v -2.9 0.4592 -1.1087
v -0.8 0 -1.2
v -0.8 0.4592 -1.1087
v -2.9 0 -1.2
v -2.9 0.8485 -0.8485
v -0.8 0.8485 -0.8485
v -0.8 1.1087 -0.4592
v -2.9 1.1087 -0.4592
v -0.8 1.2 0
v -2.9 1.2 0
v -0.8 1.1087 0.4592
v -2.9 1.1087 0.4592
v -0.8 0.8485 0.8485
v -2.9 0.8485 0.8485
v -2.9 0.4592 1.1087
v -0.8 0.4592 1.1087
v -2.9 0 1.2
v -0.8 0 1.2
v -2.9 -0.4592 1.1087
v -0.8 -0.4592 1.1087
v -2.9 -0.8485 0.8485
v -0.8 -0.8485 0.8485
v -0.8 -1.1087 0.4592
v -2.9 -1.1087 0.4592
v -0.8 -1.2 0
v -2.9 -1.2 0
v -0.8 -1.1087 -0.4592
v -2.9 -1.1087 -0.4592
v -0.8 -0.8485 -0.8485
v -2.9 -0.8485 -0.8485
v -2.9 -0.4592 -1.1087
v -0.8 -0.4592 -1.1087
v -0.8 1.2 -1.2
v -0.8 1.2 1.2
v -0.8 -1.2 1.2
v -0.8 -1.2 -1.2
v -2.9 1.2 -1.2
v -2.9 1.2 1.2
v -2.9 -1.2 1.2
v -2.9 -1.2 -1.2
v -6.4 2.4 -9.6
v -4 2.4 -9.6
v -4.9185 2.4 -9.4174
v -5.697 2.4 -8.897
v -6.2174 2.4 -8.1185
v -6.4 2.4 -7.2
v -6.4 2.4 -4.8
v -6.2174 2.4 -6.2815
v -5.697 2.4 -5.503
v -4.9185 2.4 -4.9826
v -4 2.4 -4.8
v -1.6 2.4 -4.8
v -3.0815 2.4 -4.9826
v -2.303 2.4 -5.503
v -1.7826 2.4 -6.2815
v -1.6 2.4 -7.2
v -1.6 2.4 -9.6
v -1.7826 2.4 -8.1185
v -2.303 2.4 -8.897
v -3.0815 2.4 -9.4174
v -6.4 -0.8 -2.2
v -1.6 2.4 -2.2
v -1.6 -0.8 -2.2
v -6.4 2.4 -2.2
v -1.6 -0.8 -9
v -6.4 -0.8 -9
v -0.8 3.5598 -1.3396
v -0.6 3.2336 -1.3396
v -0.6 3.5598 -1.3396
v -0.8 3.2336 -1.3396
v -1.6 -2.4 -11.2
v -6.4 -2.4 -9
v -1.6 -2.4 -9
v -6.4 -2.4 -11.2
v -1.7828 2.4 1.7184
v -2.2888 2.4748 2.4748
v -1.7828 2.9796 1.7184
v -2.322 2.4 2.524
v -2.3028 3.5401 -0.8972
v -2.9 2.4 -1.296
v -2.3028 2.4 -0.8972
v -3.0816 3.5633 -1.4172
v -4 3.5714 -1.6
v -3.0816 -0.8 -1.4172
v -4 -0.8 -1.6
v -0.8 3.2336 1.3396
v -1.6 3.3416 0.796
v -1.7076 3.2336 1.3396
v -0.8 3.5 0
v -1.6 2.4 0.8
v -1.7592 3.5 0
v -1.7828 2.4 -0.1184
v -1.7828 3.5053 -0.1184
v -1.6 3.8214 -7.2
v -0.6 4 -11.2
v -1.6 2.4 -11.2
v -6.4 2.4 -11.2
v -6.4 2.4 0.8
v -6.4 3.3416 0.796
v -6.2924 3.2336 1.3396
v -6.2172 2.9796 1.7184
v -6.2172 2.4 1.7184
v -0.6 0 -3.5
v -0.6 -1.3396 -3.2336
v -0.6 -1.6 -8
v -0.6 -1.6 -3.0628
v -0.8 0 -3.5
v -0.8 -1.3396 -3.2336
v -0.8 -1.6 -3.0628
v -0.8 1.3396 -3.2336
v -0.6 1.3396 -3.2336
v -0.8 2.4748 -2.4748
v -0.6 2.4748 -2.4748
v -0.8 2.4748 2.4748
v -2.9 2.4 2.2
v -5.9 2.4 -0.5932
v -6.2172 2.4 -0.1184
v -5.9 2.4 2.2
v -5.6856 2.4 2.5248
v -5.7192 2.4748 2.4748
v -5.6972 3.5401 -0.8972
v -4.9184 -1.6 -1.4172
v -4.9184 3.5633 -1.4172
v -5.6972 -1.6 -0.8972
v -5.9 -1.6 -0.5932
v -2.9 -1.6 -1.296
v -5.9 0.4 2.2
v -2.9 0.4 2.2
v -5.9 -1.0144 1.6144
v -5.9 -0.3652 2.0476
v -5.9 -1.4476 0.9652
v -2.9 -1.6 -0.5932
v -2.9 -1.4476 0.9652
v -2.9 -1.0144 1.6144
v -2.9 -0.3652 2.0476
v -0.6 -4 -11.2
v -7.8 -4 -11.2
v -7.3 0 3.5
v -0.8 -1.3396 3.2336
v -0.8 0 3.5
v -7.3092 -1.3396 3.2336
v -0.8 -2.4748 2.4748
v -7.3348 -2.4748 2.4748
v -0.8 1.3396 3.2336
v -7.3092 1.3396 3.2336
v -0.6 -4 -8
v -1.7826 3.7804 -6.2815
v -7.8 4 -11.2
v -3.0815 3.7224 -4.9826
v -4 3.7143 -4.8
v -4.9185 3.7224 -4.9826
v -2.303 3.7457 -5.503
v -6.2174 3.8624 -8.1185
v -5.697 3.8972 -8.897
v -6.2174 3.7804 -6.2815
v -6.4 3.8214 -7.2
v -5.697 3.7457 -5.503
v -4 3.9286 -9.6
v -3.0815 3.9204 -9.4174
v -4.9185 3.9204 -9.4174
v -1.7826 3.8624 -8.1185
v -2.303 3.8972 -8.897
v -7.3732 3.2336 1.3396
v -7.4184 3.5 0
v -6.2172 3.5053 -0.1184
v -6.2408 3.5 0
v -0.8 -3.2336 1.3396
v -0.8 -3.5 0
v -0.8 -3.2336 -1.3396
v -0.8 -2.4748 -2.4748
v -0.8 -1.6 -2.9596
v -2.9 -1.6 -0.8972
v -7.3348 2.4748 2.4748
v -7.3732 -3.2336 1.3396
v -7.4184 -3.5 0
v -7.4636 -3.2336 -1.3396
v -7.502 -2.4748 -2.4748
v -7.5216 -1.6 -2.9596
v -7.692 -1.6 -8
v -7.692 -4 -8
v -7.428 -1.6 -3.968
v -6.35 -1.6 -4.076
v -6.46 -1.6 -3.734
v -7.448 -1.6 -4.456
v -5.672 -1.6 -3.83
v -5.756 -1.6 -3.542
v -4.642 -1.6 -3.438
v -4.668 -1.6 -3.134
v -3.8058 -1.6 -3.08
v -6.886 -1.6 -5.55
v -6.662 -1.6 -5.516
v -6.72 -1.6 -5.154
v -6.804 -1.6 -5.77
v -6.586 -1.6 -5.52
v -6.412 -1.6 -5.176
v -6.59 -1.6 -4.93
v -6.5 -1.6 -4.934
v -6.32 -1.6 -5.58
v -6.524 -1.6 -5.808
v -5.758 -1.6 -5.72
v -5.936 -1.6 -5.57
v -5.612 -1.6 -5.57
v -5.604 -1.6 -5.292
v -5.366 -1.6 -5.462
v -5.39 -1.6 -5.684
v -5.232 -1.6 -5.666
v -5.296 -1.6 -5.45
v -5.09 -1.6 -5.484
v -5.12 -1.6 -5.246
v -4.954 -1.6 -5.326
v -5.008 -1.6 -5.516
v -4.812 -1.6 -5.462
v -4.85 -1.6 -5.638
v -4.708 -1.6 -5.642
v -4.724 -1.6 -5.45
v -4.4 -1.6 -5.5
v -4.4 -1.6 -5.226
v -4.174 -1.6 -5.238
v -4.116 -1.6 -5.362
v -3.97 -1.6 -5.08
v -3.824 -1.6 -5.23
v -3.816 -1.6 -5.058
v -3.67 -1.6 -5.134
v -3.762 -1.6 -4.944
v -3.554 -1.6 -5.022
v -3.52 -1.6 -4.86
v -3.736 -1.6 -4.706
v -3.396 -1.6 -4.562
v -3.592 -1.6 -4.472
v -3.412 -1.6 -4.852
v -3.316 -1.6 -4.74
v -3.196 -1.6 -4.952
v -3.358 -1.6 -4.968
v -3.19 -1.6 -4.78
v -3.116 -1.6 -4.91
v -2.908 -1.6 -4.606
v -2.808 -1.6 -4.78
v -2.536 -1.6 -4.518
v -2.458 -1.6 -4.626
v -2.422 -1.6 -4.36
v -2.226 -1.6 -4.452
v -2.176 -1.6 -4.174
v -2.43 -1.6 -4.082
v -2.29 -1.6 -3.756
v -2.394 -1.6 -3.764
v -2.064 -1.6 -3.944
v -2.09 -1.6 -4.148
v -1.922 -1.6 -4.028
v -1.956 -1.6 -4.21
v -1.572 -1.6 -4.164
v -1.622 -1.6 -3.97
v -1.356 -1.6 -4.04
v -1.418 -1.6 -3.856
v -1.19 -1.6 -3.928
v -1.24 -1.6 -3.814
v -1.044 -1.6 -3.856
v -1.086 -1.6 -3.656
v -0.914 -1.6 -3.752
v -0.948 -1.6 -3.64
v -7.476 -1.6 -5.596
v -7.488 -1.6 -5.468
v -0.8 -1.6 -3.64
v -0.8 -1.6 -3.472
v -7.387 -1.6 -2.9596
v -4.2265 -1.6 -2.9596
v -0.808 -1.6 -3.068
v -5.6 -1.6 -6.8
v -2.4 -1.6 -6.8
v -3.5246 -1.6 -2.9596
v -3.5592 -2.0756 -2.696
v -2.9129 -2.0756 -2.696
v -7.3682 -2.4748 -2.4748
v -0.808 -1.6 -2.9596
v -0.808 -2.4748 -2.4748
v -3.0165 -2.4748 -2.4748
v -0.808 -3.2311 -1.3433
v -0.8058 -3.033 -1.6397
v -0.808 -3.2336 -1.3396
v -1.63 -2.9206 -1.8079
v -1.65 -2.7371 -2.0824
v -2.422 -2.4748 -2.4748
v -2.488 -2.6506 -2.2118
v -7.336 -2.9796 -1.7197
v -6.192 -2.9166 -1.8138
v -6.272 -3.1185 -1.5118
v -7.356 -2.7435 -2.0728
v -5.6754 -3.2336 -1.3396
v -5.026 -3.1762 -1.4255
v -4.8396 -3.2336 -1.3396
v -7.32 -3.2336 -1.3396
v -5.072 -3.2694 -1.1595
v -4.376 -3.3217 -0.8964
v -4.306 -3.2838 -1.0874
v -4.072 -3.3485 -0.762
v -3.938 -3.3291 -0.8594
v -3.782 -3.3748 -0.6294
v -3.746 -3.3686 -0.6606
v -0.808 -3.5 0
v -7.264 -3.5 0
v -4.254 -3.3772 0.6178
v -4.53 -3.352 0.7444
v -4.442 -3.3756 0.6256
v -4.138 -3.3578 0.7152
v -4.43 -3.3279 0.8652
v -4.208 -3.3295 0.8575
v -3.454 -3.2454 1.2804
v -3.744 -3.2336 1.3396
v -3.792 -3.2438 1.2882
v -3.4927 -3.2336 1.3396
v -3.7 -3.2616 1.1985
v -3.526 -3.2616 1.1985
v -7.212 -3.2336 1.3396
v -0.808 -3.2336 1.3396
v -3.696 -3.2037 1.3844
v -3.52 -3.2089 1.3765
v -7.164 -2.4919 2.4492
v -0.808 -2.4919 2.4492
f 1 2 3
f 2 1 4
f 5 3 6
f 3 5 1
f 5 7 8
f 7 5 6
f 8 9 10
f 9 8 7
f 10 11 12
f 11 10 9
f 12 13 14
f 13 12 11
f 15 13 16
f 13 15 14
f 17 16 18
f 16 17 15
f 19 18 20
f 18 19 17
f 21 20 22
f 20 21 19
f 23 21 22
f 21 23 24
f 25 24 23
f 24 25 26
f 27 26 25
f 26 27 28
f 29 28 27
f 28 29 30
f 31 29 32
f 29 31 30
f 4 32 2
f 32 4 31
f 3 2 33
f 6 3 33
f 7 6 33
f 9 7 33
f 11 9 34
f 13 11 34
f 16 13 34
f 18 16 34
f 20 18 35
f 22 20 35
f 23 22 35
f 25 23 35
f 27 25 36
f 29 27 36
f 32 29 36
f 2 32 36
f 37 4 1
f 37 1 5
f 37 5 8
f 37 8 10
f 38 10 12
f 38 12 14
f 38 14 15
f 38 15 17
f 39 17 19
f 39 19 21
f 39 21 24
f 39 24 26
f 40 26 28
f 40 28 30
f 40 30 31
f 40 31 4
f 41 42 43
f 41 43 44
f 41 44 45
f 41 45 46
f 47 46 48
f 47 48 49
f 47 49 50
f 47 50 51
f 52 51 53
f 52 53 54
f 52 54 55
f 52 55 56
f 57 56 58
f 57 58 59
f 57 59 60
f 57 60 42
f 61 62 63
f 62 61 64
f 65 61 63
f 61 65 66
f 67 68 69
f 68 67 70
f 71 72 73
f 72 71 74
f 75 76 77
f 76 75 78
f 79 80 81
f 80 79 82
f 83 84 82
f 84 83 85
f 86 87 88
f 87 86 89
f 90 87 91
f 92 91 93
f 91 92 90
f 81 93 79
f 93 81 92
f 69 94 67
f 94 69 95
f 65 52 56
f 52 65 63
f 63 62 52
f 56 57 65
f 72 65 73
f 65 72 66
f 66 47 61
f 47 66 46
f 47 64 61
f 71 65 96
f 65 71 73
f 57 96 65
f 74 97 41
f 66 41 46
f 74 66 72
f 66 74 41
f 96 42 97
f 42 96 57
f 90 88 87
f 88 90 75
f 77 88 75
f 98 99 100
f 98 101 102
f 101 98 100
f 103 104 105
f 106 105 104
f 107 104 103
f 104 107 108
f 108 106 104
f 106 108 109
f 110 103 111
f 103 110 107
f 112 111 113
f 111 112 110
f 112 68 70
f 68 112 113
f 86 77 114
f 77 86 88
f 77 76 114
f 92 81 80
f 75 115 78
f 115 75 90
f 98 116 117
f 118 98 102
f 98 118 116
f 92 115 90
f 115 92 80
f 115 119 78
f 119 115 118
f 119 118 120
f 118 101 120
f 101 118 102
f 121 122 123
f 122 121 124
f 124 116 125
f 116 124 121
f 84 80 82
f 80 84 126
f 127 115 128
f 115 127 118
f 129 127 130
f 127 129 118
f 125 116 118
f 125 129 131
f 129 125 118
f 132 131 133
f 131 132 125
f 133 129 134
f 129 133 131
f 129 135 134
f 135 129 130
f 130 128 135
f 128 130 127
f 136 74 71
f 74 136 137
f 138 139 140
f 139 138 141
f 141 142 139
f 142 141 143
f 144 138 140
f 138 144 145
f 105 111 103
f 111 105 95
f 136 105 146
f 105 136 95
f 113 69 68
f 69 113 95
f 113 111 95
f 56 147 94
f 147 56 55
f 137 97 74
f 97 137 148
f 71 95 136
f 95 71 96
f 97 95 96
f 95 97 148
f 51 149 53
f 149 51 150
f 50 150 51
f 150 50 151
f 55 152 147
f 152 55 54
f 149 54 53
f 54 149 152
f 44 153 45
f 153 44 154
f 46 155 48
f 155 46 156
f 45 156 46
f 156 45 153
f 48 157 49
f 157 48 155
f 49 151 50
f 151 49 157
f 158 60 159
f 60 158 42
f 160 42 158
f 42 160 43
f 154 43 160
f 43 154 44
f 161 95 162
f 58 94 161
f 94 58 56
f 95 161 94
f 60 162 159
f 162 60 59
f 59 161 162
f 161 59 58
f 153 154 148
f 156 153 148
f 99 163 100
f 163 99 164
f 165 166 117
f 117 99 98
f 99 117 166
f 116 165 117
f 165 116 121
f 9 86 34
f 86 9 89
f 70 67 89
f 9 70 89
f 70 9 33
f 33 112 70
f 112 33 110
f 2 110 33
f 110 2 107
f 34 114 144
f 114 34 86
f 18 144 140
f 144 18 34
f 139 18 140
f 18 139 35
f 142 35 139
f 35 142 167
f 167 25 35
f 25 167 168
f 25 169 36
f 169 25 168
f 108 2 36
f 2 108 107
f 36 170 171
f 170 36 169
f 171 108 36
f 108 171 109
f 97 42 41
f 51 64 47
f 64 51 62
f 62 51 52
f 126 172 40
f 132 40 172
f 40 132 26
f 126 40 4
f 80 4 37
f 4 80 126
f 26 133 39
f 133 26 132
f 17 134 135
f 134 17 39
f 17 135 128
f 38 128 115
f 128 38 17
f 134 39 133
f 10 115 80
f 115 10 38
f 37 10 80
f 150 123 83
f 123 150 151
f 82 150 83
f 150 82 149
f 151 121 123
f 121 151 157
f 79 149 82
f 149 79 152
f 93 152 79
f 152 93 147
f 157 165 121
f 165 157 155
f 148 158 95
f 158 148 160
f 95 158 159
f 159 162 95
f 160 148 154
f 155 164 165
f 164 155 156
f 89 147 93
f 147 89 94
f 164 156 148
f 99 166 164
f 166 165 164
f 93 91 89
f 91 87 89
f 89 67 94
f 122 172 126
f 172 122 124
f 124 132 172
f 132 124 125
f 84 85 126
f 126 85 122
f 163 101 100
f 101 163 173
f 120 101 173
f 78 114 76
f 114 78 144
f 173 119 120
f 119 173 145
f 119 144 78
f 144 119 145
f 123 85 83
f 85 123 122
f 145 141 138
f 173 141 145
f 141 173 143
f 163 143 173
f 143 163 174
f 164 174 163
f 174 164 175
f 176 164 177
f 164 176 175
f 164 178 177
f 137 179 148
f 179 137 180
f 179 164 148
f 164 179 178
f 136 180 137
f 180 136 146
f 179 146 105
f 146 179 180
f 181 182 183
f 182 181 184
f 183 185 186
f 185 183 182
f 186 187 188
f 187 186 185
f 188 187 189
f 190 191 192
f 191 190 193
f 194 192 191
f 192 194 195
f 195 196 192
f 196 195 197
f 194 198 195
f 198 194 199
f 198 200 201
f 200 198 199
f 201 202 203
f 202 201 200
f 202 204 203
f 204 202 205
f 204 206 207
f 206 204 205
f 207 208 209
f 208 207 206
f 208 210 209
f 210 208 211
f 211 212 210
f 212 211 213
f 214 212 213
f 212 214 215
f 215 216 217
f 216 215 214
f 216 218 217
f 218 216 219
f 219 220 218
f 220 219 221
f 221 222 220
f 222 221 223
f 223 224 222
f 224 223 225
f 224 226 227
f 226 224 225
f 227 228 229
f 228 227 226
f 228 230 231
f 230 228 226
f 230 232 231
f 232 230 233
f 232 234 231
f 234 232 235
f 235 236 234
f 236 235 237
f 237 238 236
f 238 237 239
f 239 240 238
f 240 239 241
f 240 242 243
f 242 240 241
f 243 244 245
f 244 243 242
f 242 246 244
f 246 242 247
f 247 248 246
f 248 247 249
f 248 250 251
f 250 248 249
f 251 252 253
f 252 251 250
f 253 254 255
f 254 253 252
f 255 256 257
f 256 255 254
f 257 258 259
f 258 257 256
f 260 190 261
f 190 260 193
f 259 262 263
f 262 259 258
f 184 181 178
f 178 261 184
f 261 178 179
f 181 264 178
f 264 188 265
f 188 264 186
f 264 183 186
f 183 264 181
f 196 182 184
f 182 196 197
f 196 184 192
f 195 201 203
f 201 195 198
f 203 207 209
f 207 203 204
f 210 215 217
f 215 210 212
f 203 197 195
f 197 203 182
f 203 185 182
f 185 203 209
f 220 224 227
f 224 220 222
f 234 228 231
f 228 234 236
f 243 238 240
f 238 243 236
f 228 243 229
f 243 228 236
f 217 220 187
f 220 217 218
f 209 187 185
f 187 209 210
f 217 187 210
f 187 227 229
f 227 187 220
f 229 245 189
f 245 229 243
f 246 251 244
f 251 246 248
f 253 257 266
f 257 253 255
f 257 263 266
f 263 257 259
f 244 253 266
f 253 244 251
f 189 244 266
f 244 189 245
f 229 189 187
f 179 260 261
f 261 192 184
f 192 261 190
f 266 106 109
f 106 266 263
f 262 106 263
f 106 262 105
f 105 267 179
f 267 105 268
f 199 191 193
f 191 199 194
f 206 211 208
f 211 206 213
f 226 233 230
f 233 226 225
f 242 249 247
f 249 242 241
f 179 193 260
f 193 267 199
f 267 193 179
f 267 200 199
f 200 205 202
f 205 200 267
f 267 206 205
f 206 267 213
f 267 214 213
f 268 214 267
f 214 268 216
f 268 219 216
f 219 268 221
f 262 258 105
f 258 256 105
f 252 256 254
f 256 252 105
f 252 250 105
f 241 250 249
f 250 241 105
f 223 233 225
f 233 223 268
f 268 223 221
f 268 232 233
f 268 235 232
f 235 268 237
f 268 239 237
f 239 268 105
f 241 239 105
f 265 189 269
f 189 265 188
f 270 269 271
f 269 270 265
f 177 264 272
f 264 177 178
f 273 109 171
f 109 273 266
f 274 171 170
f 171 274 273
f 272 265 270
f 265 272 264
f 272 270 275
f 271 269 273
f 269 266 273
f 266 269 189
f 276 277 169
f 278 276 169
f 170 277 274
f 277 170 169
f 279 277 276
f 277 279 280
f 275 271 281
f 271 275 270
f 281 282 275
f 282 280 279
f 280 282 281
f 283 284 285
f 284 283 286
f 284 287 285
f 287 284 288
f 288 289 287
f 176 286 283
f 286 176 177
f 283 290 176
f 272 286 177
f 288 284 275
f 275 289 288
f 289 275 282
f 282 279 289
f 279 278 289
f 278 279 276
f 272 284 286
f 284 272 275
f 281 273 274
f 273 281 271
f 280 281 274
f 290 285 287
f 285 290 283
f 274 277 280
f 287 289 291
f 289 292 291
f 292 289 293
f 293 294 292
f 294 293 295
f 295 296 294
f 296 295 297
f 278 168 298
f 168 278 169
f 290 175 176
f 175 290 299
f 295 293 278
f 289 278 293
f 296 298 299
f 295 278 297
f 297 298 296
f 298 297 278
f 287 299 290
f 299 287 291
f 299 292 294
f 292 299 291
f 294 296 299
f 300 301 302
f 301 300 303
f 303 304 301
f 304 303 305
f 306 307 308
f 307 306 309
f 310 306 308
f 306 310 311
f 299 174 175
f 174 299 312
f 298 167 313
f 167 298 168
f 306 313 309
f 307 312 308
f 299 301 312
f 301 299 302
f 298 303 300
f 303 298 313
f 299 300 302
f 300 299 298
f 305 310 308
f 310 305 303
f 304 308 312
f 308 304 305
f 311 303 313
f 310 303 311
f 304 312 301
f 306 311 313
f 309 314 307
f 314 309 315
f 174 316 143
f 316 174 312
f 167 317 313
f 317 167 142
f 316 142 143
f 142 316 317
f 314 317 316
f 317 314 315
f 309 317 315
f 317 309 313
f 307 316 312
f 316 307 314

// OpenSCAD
use <../lib.scad>
use <s/3817bs01.scad>
function ldraw_lib__3816bpq0() = [
// 0 ~Minifig Leg Right with DarkBlue Loincloth Pattern (Obsolete)
// 0 Name: 3816bpq0.dat
// 0 Author: Magnus Forsberg [MagFors]
// 0 !LDRAW_ORG Part UPDATE 2023-03
// 0 !LICENSE Licensed under CC BY 4.0 : see CAreadme.txt
// 
// 0 !HELP Move down 12 LDU to align with hips
// 
// 0 BFC CERTIFY CCW
  [0,"BFC","CERTIFY"],
  [0,"BFC","CCW"],
// 
// 0 !KEYWORDS Bricklink 970c00pb0074, Mummy Warrior, Pharaoh's Quest, Set 7326
// 
// 0 !HISTORY 2011-12-29 [Wesley] Original pattern design
// 0 !HISTORY 2020-06-03 [MagFors] Adapted to corrected geometry
// 0 !HISTORY 2020-12-29 [PTadmin] Official Update 2020-03
// 0 !HISTORY 2023-05-25 [MagFors] Obsoleted due to bad geometry
// 0 !HISTORY 2023-06-24 [OrionP] Official Update 2023-03
// 
// 
// 1 16 0 0 0 -1 0 0 0 1 0 0 0 1 s\3817bs01.dat
  [1,16,0,0,0,-1,0,0,0,1,0,0,0,1, ldraw_lib__s__3817bs01()],
// 4 16 -1.5 28 -10 -1.5 20 -10 -19.23 20 -10 -19.5 28 -10
  [4,16,-1.5,28,-10,-1.5,20,-10,-19.23,20,-10,-19.5,28,-10],
// 4 16 -19.23 20 -4 -19.23 20 -10 -1.5 20 -10 -1.5 20 -4
  [4,16,-19.23,20,-4,-19.23,20,-10,-1.5,20,-10,-1.5,20,-4],
// 5 24 -2 3.349 -8.084 -18.659 3.349 -8.084 -2 0 -8.75 -2 6.187 -6.187
  [5,24,-2,3.349,-8.084,-18.659,3.349,-8.084,-2,0,-8.75,-2,6.187,-6.187],
// 5 24 -2 6.187 -6.187 -18.755 6.187 -6.187 -2 7.399 -4 -2 3.349 -8.084
  [5,24,-2,6.187,-6.187,-18.755,6.187,-6.187,-2,7.399,-4,-2,3.349,-8.084],
// 5 24 -2 0 -8.75 -18.546 0 -8.75 -2 3.349 -8.084 -2 -3.349 -8.084
  [5,24,-2,0,-8.75,-18.546,0,-8.75,-2,3.349,-8.084,-2,-3.349,-8.084],
// 5 24 -2 -3.349 -8.084 -18.433 -3.349 -8.084 -2 0 -8.75 -2 -6.187 -6.187
  [5,24,-2,-3.349,-8.084,-18.433,-3.349,-8.084,-2,0,-8.75,-2,-6.187,-6.187],
// 0 // pattern
// 4 379 -18.57 9.92 -4 -18.62 11.14 -4 -15.875 10.19 -4 -16.15 9.335 -4
  [4,379,-18.57,9.92,-4,-18.62,11.14,-4,-15.875,10.19,-4,-16.15,9.335,-4],
// 4 379 -15.875 10.19 -4 -14.18 9.575 -4 -14.39 8.855 -4 -16.15 9.335 -4
  [4,379,-15.875,10.19,-4,-14.18,9.575,-4,-14.39,8.855,-4,-16.15,9.335,-4],
// 4 379 -14.18 9.575 -4 -11.605 8.595 -4 -11.67 7.835 -4 -14.39 8.855 -4
  [4,379,-14.18,9.575,-4,-11.605,8.595,-4,-11.67,7.835,-4,-14.39,8.855,-4],
// 3 379 -11.67 7.835 -4 -11.605 8.595 -4 -9.5145 7.7 -4
  [3,379,-11.67,7.835,-4,-11.605,8.595,-4,-9.5145,7.7,-4],
// 4 0 -17.215 13.875 -4 -17.01 14.425 -4 -16.655 13.79 -4 -16.8 12.885 -4
  [4,0,-17.215,13.875,-4,-17.01,14.425,-4,-16.655,13.79,-4,-16.8,12.885,-4],
// 4 0 -16.655 13.79 -4 -16.465 13.8 -4 -16.03 12.94 -4 -16.8 12.885 -4
  [4,0,-16.655,13.79,-4,-16.465,13.8,-4,-16.03,12.94,-4,-16.8,12.885,-4],
// 4 0 -16.03 12.94 -4 -16.25 12.335 -4 -16.475 12.325 -4 -16.8 12.885 -4
  [4,0,-16.03,12.94,-4,-16.25,12.335,-4,-16.475,12.325,-4,-16.8,12.885,-4],
// 4 0 -16.465 13.8 -4 -16.31 14.52 -4 -15.8 13.95 -4 -16.03 12.94 -4
  [4,0,-16.465,13.8,-4,-16.31,14.52,-4,-15.8,13.95,-4,-16.03,12.94,-4],
// 4 0 -16.31 14.52 -4 -14.395 14.3 -4 -14.84 13.925 -4 -15.8 13.95 -4
  [4,0,-16.31,14.52,-4,-14.395,14.3,-4,-14.84,13.925,-4,-15.8,13.95,-4],
// 4 0 -14.395 14.3 -4 -14.03 13.925 -4 -14.01 13.23 -4 -14.84 13.925 -4
  [4,0,-14.395,14.3,-4,-14.03,13.925,-4,-14.01,13.23,-4,-14.84,13.925,-4],
// 4 0 -14.03 13.925 -4 -13.475 14.21 -4 -13.415 13.655 -4 -14.01 13.23 -4
  [4,0,-14.03,13.925,-4,-13.475,14.21,-4,-13.415,13.655,-4,-14.01,13.23,-4],
// 4 0 -13.475 14.21 -4 -13.08 14.165 -4 -13.24 13.625 -4 -13.415 13.655 -4
  [4,0,-13.475,14.21,-4,-13.08,14.165,-4,-13.24,13.625,-4,-13.415,13.655,-4],
// 4 0 -13.08 14.165 -4 -12.725 13.71 -4 -12.8 13.115 -4 -13.24 13.625 -4
  [4,0,-13.08,14.165,-4,-12.725,13.71,-4,-12.8,13.115,-4,-13.24,13.625,-4],
// 4 0 -12.725 13.71 -4 -12.52 13.79 -4 -12.385 13.315 -4 -12.8 13.115 -4
  [4,0,-12.725,13.71,-4,-12.52,13.79,-4,-12.385,13.315,-4,-12.8,13.115,-4],
// 4 0 -12.52 13.79 -4 -12.125 14.095 -4 -12.03 13.655 -4 -12.385 13.315 -4
  [4,0,-12.52,13.79,-4,-12.125,14.095,-4,-12.03,13.655,-4,-12.385,13.315,-4],
// 4 0 -12.125 14.095 -4 -11.77 14.105 -4 -11.81 13.625 -4 -12.03 13.655 -4
  [4,0,-12.125,14.095,-4,-11.77,14.105,-4,-11.81,13.625,-4,-12.03,13.655,-4],
// 4 0 -11.77 14.105 -4 -11 13.75 -4 -11 13.065 -4 -11.81 13.625 -4
  [4,0,-11.77,14.105,-4,-11,13.75,-4,-11,13.065,-4,-11.81,13.625,-4],
// 4 0 -11 13.75 -4 -10.29 13.405 -4 -10.435 13.095 -4 -11 13.065 -4
  [4,0,-11,13.75,-4,-10.29,13.405,-4,-10.435,13.095,-4,-11,13.065,-4],
// 4 0 -10.29 13.405 -4 -9.56 13.075 -4 -9.925 12.7 -4 -10.435 13.095 -4
  [4,0,-10.29,13.405,-4,-9.56,13.075,-4,-9.925,12.7,-4,-10.435,13.095,-4],
// 4 0 -9.56 13.075 -4 -9.175 12.835 -4 -9.54 12.645 -4 -9.925 12.7 -4
  [4,0,-9.56,13.075,-4,-9.175,12.835,-4,-9.54,12.645,-4,-9.925,12.7,-4],
// 4 0 -9.175 12.835 -4 -8.885 12.555 -4 -9.405 12.36 -4 -9.54 12.645 -4
  [4,0,-9.175,12.835,-4,-8.885,12.555,-4,-9.405,12.36,-4,-9.54,12.645,-4],
// 4 0 -8.885 12.555 -4 -8.8 12.15 -4 -9.34 11.765 -4 -9.405 12.36 -4
  [4,0,-8.885,12.555,-4,-8.8,12.15,-4,-9.34,11.765,-4,-9.405,12.36,-4],
// 4 0 -8.8 12.15 -4 -8.49 11.405 -4 -8.98 11.18 -4 -9.34 11.765 -4
  [4,0,-8.8,12.15,-4,-8.49,11.405,-4,-8.98,11.18,-4,-9.34,11.765,-4],
// 4 0 -8.8 12.15 -4 -8.53 12.13 -4 -8.29 11.85 -4 -8.49 11.405 -4
  [4,0,-8.8,12.15,-4,-8.53,12.13,-4,-8.29,11.85,-4,-8.49,11.405,-4],
// 4 0 -8.53 12.13 -4 -8.395 12.42 -4 -7.99 12.38 -4 -8.29 11.85 -4
  [4,0,-8.53,12.13,-4,-8.395,12.42,-4,-7.99,12.38,-4,-8.29,11.85,-4],
// 4 0 -7.99 12.38 -4 -7.79 12.275 -4 -7.975 11.95 -4 -8.29 11.85 -4
  [4,0,-7.99,12.38,-4,-7.79,12.275,-4,-7.975,11.95,-4,-8.29,11.85,-4],
// 4 0 -7.79 12.275 -4 -7.02 11.95 -4 -7.27 11.515 -4 -7.975 11.95 -4
  [4,0,-7.79,12.275,-4,-7.02,11.95,-4,-7.27,11.515,-4,-7.975,11.95,-4],
// 4 0 -7.02 11.95 -4 -6.145 11.565 -4 -6.34 11.295 -4 -7.27 11.515 -4
  [4,0,-7.02,11.95,-4,-6.145,11.565,-4,-6.34,11.295,-4,-7.27,11.515,-4],
// 4 0 -6.145 11.565 -4 -5.565 11.13 -4 -6.055 10.9 -4 -6.34 11.295 -4
  [4,0,-6.145,11.565,-4,-5.565,11.13,-4,-6.055,10.9,-4,-6.34,11.295,-4],
// 4 0 -5.565 11.13 -4 -5.44 10.435 -4 -6.075 10.205 -4 -6.055 10.9 -4
  [4,0,-5.565,11.13,-4,-5.44,10.435,-4,-6.075,10.205,-4,-6.055,10.9,-4],
// 4 0 -5.44 10.435 -4 -5.725 9.39 -4 -5.985 9.41 -4 -6.075 10.205 -4
  [4,0,-5.44,10.435,-4,-5.725,9.39,-4,-5.985,9.41,-4,-6.075,10.205,-4],
// 4 0 -5.44 10.435 -4 -5.225 10.37 -4 -5.16 9.86 -4 -5.725 9.39 -4
  [4,0,-5.44,10.435,-4,-5.225,10.37,-4,-5.16,9.86,-4,-5.725,9.39,-4],
// 4 0 -5.225 10.37 -4 -4.89 10.525 -4 -4.805 10.07 -4 -5.16 9.86 -4
  [4,0,-5.225,10.37,-4,-4.89,10.525,-4,-4.805,10.07,-4,-5.16,9.86,-4],
// 4 0 -4.89 10.525 -4 -3.93 10.41 -4 -4.055 9.925 -4 -4.805 10.07 -4
  [4,0,-4.89,10.525,-4,-3.93,10.41,-4,-4.055,9.925,-4,-4.805,10.07,-4],
// 4 0 -3.93 10.41 -4 -3.39 10.1 -4 -3.545 9.64 -4 -4.055 9.925 -4
  [4,0,-3.93,10.41,-4,-3.39,10.1,-4,-3.545,9.64,-4,-4.055,9.925,-4],
// 4 0 -3.39 10.1 -4 -2.975 9.82 -4 -3.1 9.535 -4 -3.545 9.64 -4
  [4,0,-3.39,10.1,-4,-2.975,9.82,-4,-3.1,9.535,-4,-3.545,9.64,-4],
// 4 0 -2.975 9.82 -4 -2.61 9.64 -4 -2.715 9.14 -4 -3.1 9.535 -4
  [4,0,-2.975,9.82,-4,-2.61,9.64,-4,-2.715,9.14,-4,-3.1,9.535,-4],
// 4 0 -2.61 9.64 -4 -2.285 9.38 -4 -2.37 9.1 -4 -2.715 9.14 -4
  [4,0,-2.61,9.64,-4,-2.285,9.38,-4,-2.37,9.1,-4,-2.715,9.14,-4],
// 4 0 -17.215 13.875 -4 -18.72 13.67 -4 -18.69 13.99 -4 -17.01 14.425 -4
  [4,0,-17.215,13.875,-4,-18.72,13.67,-4,-18.69,13.99,-4,-17.01,14.425,-4],
// 4 0 -2.285 9.38 -4 -2 9.1 -4 -2 8.68 -4 -2.37 9.1 -4
  [4,0,-2.285,9.38,-4,-2,9.1,-4,-2,8.68,-4,-2.37,9.1,-4],
// 3 16 -18.62 11.14 -4 -18.57 9.92 -4 -18.804 7.399 -4
  [3,16,-18.62,11.14,-4,-18.57,9.92,-4,-18.804,7.399,-4],
// 4 16 -18.72 13.67 -4 -18.62 11.14 -4 -18.804 7.399 -4 -19.23 20 -4
  [4,16,-18.72,13.67,-4,-18.62,11.14,-4,-18.804,7.399,-4,-19.23,20,-4],
// 3 16 -18.57 9.92 -4 -18.4675 7.399 -4 -18.804 7.399 -4
  [3,16,-18.57,9.92,-4,-18.4675,7.399,-4,-18.804,7.399,-4],
// 4 272 -18.4675 7.399 -4 -14.39 8.855 -4 -11.67 7.835 -4 -10.5662 7.399 -4
  [4,272,-18.4675,7.399,-4,-14.39,8.855,-4,-11.67,7.835,-4,-10.5662,7.399,-4],
// 4 272 -14.39 8.855 -4 -18.4675 7.399 -4 -18.57 9.92 -4 -16.15 9.335 -4
  [4,272,-14.39,8.855,-4,-18.4675,7.399,-4,-18.57,9.92,-4,-16.15,9.335,-4],
// 4 272 -18.62 11.14 -4 -16.475 12.325 -4 -16.25 12.335 -4 -15.875 10.19 -4
  [4,272,-18.62,11.14,-4,-16.475,12.325,-4,-16.25,12.335,-4,-15.875,10.19,-4],
// 3 272 -16.475 12.325 -4 -18.62 11.14 -4 -16.8 12.885 -4
  [3,272,-16.475,12.325,-4,-18.62,11.14,-4,-16.8,12.885,-4],
// 4 272 -15.8 13.95 -4 -14.84 13.925 -4 -14.01 13.23 -4 -16.03 12.94 -4
  [4,272,-15.8,13.95,-4,-14.84,13.925,-4,-14.01,13.23,-4,-16.03,12.94,-4],
// 4 272 -14.01 13.23 -4 -13.415 13.655 -4 -13.24 13.625 -4 -12.8 13.115 -4
  [4,272,-14.01,13.23,-4,-13.415,13.655,-4,-13.24,13.625,-4,-12.8,13.115,-4],
// 4 272 -12.385 13.315 -4 -12.03 13.655 -4 -11.81 13.625 -4 -11 13.065 -4
  [4,272,-12.385,13.315,-4,-12.03,13.655,-4,-11.81,13.625,-4,-11,13.065,-4],
// 4 272 -15.875 10.19 -4 -16.25 12.335 -4 -16.03 12.94 -4 -14.01 13.23 -4
  [4,272,-15.875,10.19,-4,-16.25,12.335,-4,-16.03,12.94,-4,-14.01,13.23,-4],
// 4 272 -14.01 13.23 -4 -12.8 13.115 -4 -14.18 9.575 -4 -15.875 10.19 -4
  [4,272,-14.01,13.23,-4,-12.8,13.115,-4,-14.18,9.575,-4,-15.875,10.19,-4],
// 4 272 -9.925 12.7 -4 -9.54 12.645 -4 -9.405 12.36 -4 -9.34 11.765 -4
  [4,272,-9.925,12.7,-4,-9.54,12.645,-4,-9.405,12.36,-4,-9.34,11.765,-4],
// 4 272 -8.49 11.405 -4 -8.29 11.85 -4 -7.975 11.95 -4 -7.27 11.515 -4
  [4,272,-8.49,11.405,-4,-8.29,11.85,-4,-7.975,11.95,-4,-7.27,11.515,-4],
// 4 272 -7.27 11.515 -4 -6.34 11.295 -4 -6.055 10.9 -4 -6.075 10.205 -4
  [4,272,-7.27,11.515,-4,-6.34,11.295,-4,-6.055,10.9,-4,-6.075,10.205,-4],
// 4 272 -8.98 11.18 -4 -8.49 11.405 -4 -7.27 11.515 -4 -6.075 10.205 -4
  [4,272,-8.98,11.18,-4,-8.49,11.405,-4,-7.27,11.515,-4,-6.075,10.205,-4],
// 4 272 -11.605 8.595 -4 -11 13.065 -4 -10.435 13.095 -4 -9.925 12.7 -4
  [4,272,-11.605,8.595,-4,-11,13.065,-4,-10.435,13.095,-4,-9.925,12.7,-4],
// 4 272 -14.18 9.575 -4 -12.8 13.115 -4 -12.385 13.315 -4 -11.605 8.595 -4
  [4,272,-14.18,9.575,-4,-12.8,13.115,-4,-12.385,13.315,-4,-11.605,8.595,-4],
// 3 272 -11 13.065 -4 -11.605 8.595 -4 -12.385 13.315 -4
  [3,272,-11,13.065,-4,-11.605,8.595,-4,-12.385,13.315,-4],
// 4 272 -8.98 11.18 -4 -11.605 8.595 -4 -9.925 12.7 -4 -9.34 11.765 -4
  [4,272,-8.98,11.18,-4,-11.605,8.595,-4,-9.925,12.7,-4,-9.34,11.765,-4],
// 4 272 -9.5145 7.7 -4 -8.98 11.18 -4 -6.075 10.205 -4 -5.985 9.41 -4
  [4,272,-9.5145,7.7,-4,-8.98,11.18,-4,-6.075,10.205,-4,-5.985,9.41,-4],
// 4 272 -5.725 9.39 -4 -5.16 9.86 -4 -4.805 10.07 -4 -4.055 9.925 -4
  [4,272,-5.725,9.39,-4,-5.16,9.86,-4,-4.805,10.07,-4,-4.055,9.925,-4],
// 4 272 -3.545 9.64 -4 -3.1 9.535 -4 -2.715 9.14 -4 -2.02 7.67 -4
  [4,272,-3.545,9.64,-4,-3.1,9.535,-4,-2.715,9.14,-4,-2.02,7.67,-4],
// 4 272 -2.715 9.14 -4 -2.37 9.1 -4 -2 8.68 -4 -2.02 7.67 -4
  [4,272,-2.715,9.14,-4,-2.37,9.1,-4,-2,8.68,-4,-2.02,7.67,-4],
// 4 272 -5.725 9.39 -4 -4.055 9.925 -4 -3.545 9.64 -4 -2.02 7.67 -4
  [4,272,-5.725,9.39,-4,-4.055,9.925,-4,-3.545,9.64,-4,-2.02,7.67,-4],
// 4 272 -2.02 7.67 -4 -9.5145 7.7 -4 -5.985 9.41 -4 -5.725 9.39 -4
  [4,272,-2.02,7.67,-4,-9.5145,7.7,-4,-5.985,9.41,-4,-5.725,9.39,-4],
// 3 272 -8.98 11.18 -4 -9.5145 7.7 -4 -11.605 8.595 -4
  [3,272,-8.98,11.18,-4,-9.5145,7.7,-4,-11.605,8.595,-4],
// 3 16 -19.23 20 -4 -18.69 13.99 -4 -18.72 13.67 -4
  [3,16,-19.23,20,-4,-18.69,13.99,-4,-18.72,13.67,-4],
// 4 272 -18.72 13.67 -4 -17.215 13.875 -4 -16.8 12.885 -4 -18.62 11.14 -4
  [4,272,-18.72,13.67,-4,-17.215,13.875,-4,-16.8,12.885,-4,-18.62,11.14,-4],
// 4 16 -2.02 7.67 -4 -2 8.68 -4 -1.5 7.657 -4 -2 7.657 -4
  [4,16,-2.02,7.67,-4,-2,8.68,-4,-1.5,7.657,-4,-2,7.657,-4],
// 4 16 -2 8.68 -4 -2 9.1 -4 -1.5 20 -4 -1.5 7.657 -4
  [4,16,-2,8.68,-4,-2,9.1,-4,-1.5,20,-4,-1.5,7.657,-4],
// 4 16 -1.5 20 -4 -6 17 -4 -14 17 -4 -19.23 20 -4
  [4,16,-1.5,20,-4,-6,17,-4,-14,17,-4,-19.23,20,-4],
// 4 16 -16.31 14.52 -4 -16.465 13.8 -4 -16.655 13.79 -4 -17.01 14.425 -4
  [4,16,-16.31,14.52,-4,-16.465,13.8,-4,-16.655,13.79,-4,-17.01,14.425,-4],
// 4 16 -12.125 14.095 -4 -12.52 13.79 -4 -12.725 13.71 -4 -13.08 14.165 -4
  [4,16,-12.125,14.095,-4,-12.52,13.79,-4,-12.725,13.71,-4,-13.08,14.165,-4],
// 4 16 -8.395 12.42 -4 -8.53 12.13 -4 -8.8 12.15 -4 -8.885 12.555 -4
  [4,16,-8.395,12.42,-4,-8.53,12.13,-4,-8.8,12.15,-4,-8.885,12.555,-4],
// 4 16 -4.89 10.525 -4 -5.225 10.37 -4 -5.44 10.435 -4 -5.565 11.13 -4
  [4,16,-4.89,10.525,-4,-5.225,10.37,-4,-5.44,10.435,-4,-5.565,11.13,-4],
// 3 16 -19.23 20 -4 -17.01 14.425 -4 -18.69 13.99 -4
  [3,16,-19.23,20,-4,-17.01,14.425,-4,-18.69,13.99,-4],
// 4 16 -14 17 -4 -16.31 14.52 -4 -17.01 14.425 -4 -19.23 20 -4
  [4,16,-14,17,-4,-16.31,14.52,-4,-17.01,14.425,-4,-19.23,20,-4],
// 3 16 -14 17 -4 -14.395 14.3 -4 -16.31 14.52 -4
  [3,16,-14,17,-4,-14.395,14.3,-4,-16.31,14.52,-4],
// 4 16 -13.475 14.21 -4 -14.03 13.925 -4 -14.395 14.3 -4 -14 17 -4
  [4,16,-13.475,14.21,-4,-14.03,13.925,-4,-14.395,14.3,-4,-14,17,-4],
// 4 16 -12.125 14.095 -4 -13.08 14.165 -4 -13.475 14.21 -4 -14 17 -4
  [4,16,-12.125,14.095,-4,-13.08,14.165,-4,-13.475,14.21,-4,-14,17,-4],
// 3 16 -14 17 -4 -11.77 14.105 -4 -12.125 14.095 -4
  [3,16,-14,17,-4,-11.77,14.105,-4,-12.125,14.095,-4],
// 4 16 -6 17 -4 -11 13.75 -4 -11.77 14.105 -4 -14 17 -4
  [4,16,-6,17,-4,-11,13.75,-4,-11.77,14.105,-4,-14,17,-4],
// 4 16 -9.56 13.075 -4 -10.29 13.405 -4 -11 13.75 -4 -6 17 -4
  [4,16,-9.56,13.075,-4,-10.29,13.405,-4,-11,13.75,-4,-6,17,-4],
// 3 16 -2 9.1 -4 -2.285 9.38 -4 -1.5 20 -4
  [3,16,-2,9.1,-4,-2.285,9.38,-4,-1.5,20,-4],
// 3 16 -2.285 9.38 -4 -2.61 9.64 -4 -1.5 20 -4
  [3,16,-2.285,9.38,-4,-2.61,9.64,-4,-1.5,20,-4],
// 4 16 -3.39 10.1 -4 -1.5 20 -4 -2.61 9.64 -4 -2.975 9.82 -4
  [4,16,-3.39,10.1,-4,-1.5,20,-4,-2.61,9.64,-4,-2.975,9.82,-4],
// 3 16 -3.39 10.1 -4 -3.93 10.41 -4 -1.5 20 -4
  [3,16,-3.39,10.1,-4,-3.93,10.41,-4,-1.5,20,-4],
// 4 16 -3.93 10.41 -4 -4.89 10.525 -4 -5.565 11.13 -4 -1.5 20 -4
  [4,16,-3.93,10.41,-4,-4.89,10.525,-4,-5.565,11.13,-4,-1.5,20,-4],
// 4 16 -6 17 -4 -8.395 12.42 -4 -8.885 12.555 -4 -9.175 12.835 -4
  [4,16,-6,17,-4,-8.395,12.42,-4,-8.885,12.555,-4,-9.175,12.835,-4],
// 3 16 -6 17 -4 -9.175 12.835 -4 -9.56 13.075 -4
  [3,16,-6,17,-4,-9.175,12.835,-4,-9.56,13.075,-4],
// 3 16 -6 17 -4 -7.99 12.38 -4 -8.395 12.42 -4
  [3,16,-6,17,-4,-7.99,12.38,-4,-8.395,12.42,-4],
// 4 16 -7.99 12.38 -4 -6 17 -4 -7.02 11.95 -4 -7.79 12.275 -4
  [4,16,-7.99,12.38,-4,-6,17,-4,-7.02,11.95,-4,-7.79,12.275,-4],
// 4 16 -6.145 11.565 -4 -7.02 11.95 -4 -6 17 -4 -1.5 20 -4
  [4,16,-6.145,11.565,-4,-7.02,11.95,-4,-6,17,-4,-1.5,20,-4],
// 3 16 -5.565 11.13 -4 -6.145 11.565 -4 -1.5 20 -4
  [3,16,-5.565,11.13,-4,-6.145,11.565,-4,-1.5,20,-4],
// 4 379 -10.5662 7.399 -4 -11.67 7.835 -4 -9.5145 7.7 -4 -8.8114 7.399 -4
  [4,379,-10.5662,7.399,-4,-11.67,7.835,-4,-9.5145,7.7,-4,-8.8114,7.399,-4],
// 4 379 -10.5662 7.399 -4 -8.8114 7.399 -4 -7.2822 6.74 -5.1891 -8.8979 6.74 -5.1891
  [4,379,-10.5662,7.399,-4,-8.8114,7.399,-4,-7.2822,6.74,-5.1891,-8.8979,6.74,-5.1891],
// 4 16 -18.4675 7.399 -4 -18.4204 6.187 -6.187 -18.755 6.187 -6.187 -18.804 7.399 -4
  [4,16,-18.4675,7.399,-4,-18.4204,6.187,-6.187,-18.755,6.187,-6.187,-18.804,7.399,-4],
// 4 16 -2 7.399 -4 -2.02 7.399 -4 -2.02 7.67 -4 -2 7.657 -4
  [4,16,-2,7.399,-4,-2.02,7.399,-4,-2.02,7.67,-4,-2,7.657,-4],
// 4 16 -2.02 7.399 -4 -2 7.399 -4 -2 6.187 -6.187 -2.02 6.187 -6.187
  [4,16,-2.02,7.399,-4,-2,7.399,-4,-2,6.187,-6.187,-2.02,6.187,-6.187],
// 4 272 -18.4204 6.187 -6.187 -18.4675 7.399 -4 -10.5662 7.399 -4 -8.8979 6.74 -5.1891
  [4,272,-18.4204,6.187,-6.187,-18.4675,7.399,-4,-10.5662,7.399,-4,-8.8979,6.74,-5.1891],
// 3 272 -18.4204 6.187 -6.187 -8.8979 6.74 -5.1891 -7.5413 6.187 -6.187
  [3,272,-18.4204,6.187,-6.187,-8.8979,6.74,-5.1891,-7.5413,6.187,-6.187],
// 3 272 -7.2822 6.74 -5.1891 -8.8114 7.399 -4 -2.02 7.399 -4
  [3,272,-7.2822,6.74,-5.1891,-8.8114,7.399,-4,-2.02,7.399,-4],
// 4 272 -2.02 7.399 -4 -8.8114 7.399 -4 -9.5145 7.7 -4 -2.02 7.67 -4
  [4,272,-2.02,7.399,-4,-8.8114,7.399,-4,-9.5145,7.7,-4,-2.02,7.67,-4],
// 3 16 -2.02 3.3583 -8.0778 -2.0145 4.0992 -7.5825 -2 3.349 -8.084
  [3,16,-2.02,3.3583,-8.0778,-2.0145,4.0992,-7.5825,-2,3.349,-8.084],
// 3 16 -2.02 3.349 -8.084 -2.02 3.3583 -8.0778 -2 3.349 -8.084
  [3,16,-2.02,3.349,-8.084,-2.02,3.3583,-8.0778,-2,3.349,-8.084],
// 4 16 -2 3.349 -8.084 -2.0145 4.0992 -7.5825 -2.02 6.187 -6.187 -2 6.187 -6.187
  [4,16,-2,3.349,-8.084,-2.0145,4.0992,-7.5825,-2.02,6.187,-6.187,-2,6.187,-6.187],
// 4 379 -4.075 4.5198 -7.3014 -4.125 5.2061 -6.8427 -2.0145 4.0992 -7.5825 -2.02 3.3583 -8.0778
  [4,379,-4.075,4.5198,-7.3014,-4.125,5.2061,-6.8427,-2.0145,4.0992,-7.5825,-2.02,3.3583,-8.0778],
// 4 379 -6.055 6.187 -6.187 -7.5413 6.187 -6.187 -8.8979 6.74 -5.1891 -7.2822 6.74 -5.1891
  [4,379,-6.055,6.187,-6.187,-7.5413,6.187,-6.187,-8.8979,6.74,-5.1891,-7.2822,6.74,-5.1891],
// 3 379 -6.055 6.187 -6.187 -6.22 5.5296 -6.6264 -7.5413 6.187 -6.187
  [3,379,-6.055,6.187,-6.187,-6.22,5.5296,-6.6264,-7.5413,6.187,-6.187],
// 4 379 -6.055 6.187 -6.187 -4.125 5.2061 -6.8427 -4.075 4.5198 -7.3014 -6.22 5.5296 -6.6264
  [4,379,-6.055,6.187,-6.187,-4.125,5.2061,-6.8427,-4.075,4.5198,-7.3014,-6.22,5.5296,-6.6264],
// 4 379 -15.68 3.7795 -7.7962 -18.34 4.2992 -7.4489 -18.39 5.1819 -6.8588 -15.48 4.5345 -7.2916
  [4,379,-15.68,3.7795,-7.7962,-18.34,4.2992,-7.4489,-18.39,5.1819,-6.8588,-15.48,4.5345,-7.2916],
// 4 379 -15.68 3.7795 -7.7962 -15.48 4.5345 -7.2916 -12.565 3.5638 -7.9404 -14.1885 3.349 -8.084
  [4,379,-15.68,3.7795,-7.7962,-15.48,4.5345,-7.2916,-12.565,3.5638,-7.9404,-14.1885,3.349,-8.084],
// 3 379 -12.565 3.5638 -7.9404 -12.0991 3.349 -8.084 -14.1885 3.349 -8.084
  [3,379,-12.565,3.5638,-7.9404,-12.0991,3.349,-8.084,-14.1885,3.349,-8.084],
// 4 16 -18.39 5.1819 -6.8588 -18.34 4.2992 -7.4489 -18.659 3.349 -8.084 -18.755 6.187 -6.187
  [4,16,-18.39,5.1819,-6.8588,-18.34,4.2992,-7.4489,-18.659,3.349,-8.084,-18.755,6.187,-6.187],
// 3 16 -18.34 4.2992 -7.4489 -18.3 3.349 -8.084 -18.659 3.349 -8.084
  [3,16,-18.34,4.2992,-7.4489,-18.3,3.349,-8.084,-18.659,3.349,-8.084],
// 3 16 -18.4204 6.187 -6.187 -18.39 5.1819 -6.8588 -18.755 6.187 -6.187
  [3,16,-18.4204,6.187,-6.187,-18.39,5.1819,-6.8588,-18.755,6.187,-6.187],
// 3 272 -12.565 3.5638 -7.9404 -15.48 4.5345 -7.2916 -7.5413 6.187 -6.187
  [3,272,-12.565,3.5638,-7.9404,-15.48,4.5345,-7.2916,-7.5413,6.187,-6.187],
// 4 272 -6.22 5.5296 -6.6264 -12.0991 3.349 -8.084 -12.565 3.5638 -7.9404 -7.5413 6.187 -6.187
  [4,272,-6.22,5.5296,-6.6264,-12.0991,3.349,-8.084,-12.565,3.5638,-7.9404,-7.5413,6.187,-6.187],
// 3 272 -6.22 5.5296 -6.6264 -4.075 4.5198 -7.3014 -12.0991 3.349 -8.084
  [3,272,-6.22,5.5296,-6.6264,-4.075,4.5198,-7.3014,-12.0991,3.349,-8.084],
// 4 272 -2.02 3.3583 -8.0778 -2.02 3.349 -8.084 -12.0991 3.349 -8.084 -4.075 4.5198 -7.3014
  [4,272,-2.02,3.3583,-8.0778,-2.02,3.349,-8.084,-12.0991,3.349,-8.084,-4.075,4.5198,-7.3014],
// 4 272 -7.5413 6.187 -6.187 -15.48 4.5345 -7.2916 -18.39 5.1819 -6.8588 -18.4204 6.187 -6.187
  [4,272,-7.5413,6.187,-6.187,-15.48,4.5345,-7.2916,-18.39,5.1819,-6.8588,-18.4204,6.187,-6.187],
// 4 272 -2.02 7.399 -4 -2.02 6.187 -6.187 -6.055 6.187 -6.187 -7.2822 6.74 -5.1891
  [4,272,-2.02,7.399,-4,-2.02,6.187,-6.187,-6.055,6.187,-6.187,-7.2822,6.74,-5.1891],
// 3 272 -4.125 5.2061 -6.8427 -6.055 6.187 -6.187 -2.02 6.187 -6.187
  [3,272,-4.125,5.2061,-6.8427,-6.055,6.187,-6.187,-2.02,6.187,-6.187],
// 4 272 -18.34 4.2992 -7.4489 -15.68 3.7795 -7.7962 -14.1885 3.349 -8.084 -18.3 3.349 -8.084
  [4,272,-18.34,4.2992,-7.4489,-15.68,3.7795,-7.7962,-14.1885,3.349,-8.084,-18.3,3.349,-8.084],
// 3 272 -2.02 6.187 -6.187 -2.0145 4.0992 -7.5825 -4.125 5.2061 -6.8427
  [3,272,-2.02,6.187,-6.187,-2.0145,4.0992,-7.5825,-4.125,5.2061,-6.8427],
// 3 379 -14.1885 3.349 -8.084 -12.0991 3.349 -8.084 -12.68 2.8988 -8.1735
  [3,379,-14.1885,3.349,-8.084,-12.0991,3.349,-8.084,-12.68,2.8988,-8.1735],
// 4 379 -10.765 2.7186 -8.2094 -10.94 2.2411 -8.3043 -12.68 2.8988 -8.1735 -12.0991 3.349 -8.084
  [4,379,-10.765,2.7186,-8.2094,-10.94,2.2411,-8.3043,-12.68,2.8988,-8.1735,-12.0991,3.349,-8.084],
// 4 379 -10.765 2.7186 -8.2094 -9.845 2.1485 -8.3227 -10.18 1.9049 -8.3712 -10.94 2.2411 -8.3043
  [4,379,-10.765,2.7186,-8.2094,-9.845,2.1485,-8.3227,-10.18,1.9049,-8.3712,-10.94,2.2411,-8.3043],
// 4 379 -9.845 2.1485 -8.3227 -9.365 1.6516 -8.4216 -9.455 1.5736 -8.4371 -10.18 1.9049 -8.3712
  [4,379,-9.845,2.1485,-8.3227,-9.365,1.6516,-8.4216,-9.455,1.5736,-8.4371,-10.18,1.9049,-8.3712],
// 4 16 -2 0 -8.75 -2.02 0 -8.75 -2.02 3.349 -8.084 -2 3.349 -8.084
  [4,16,-2,0,-8.75,-2.02,0,-8.75,-2.02,3.349,-8.084,-2,3.349,-8.084],
// 4 16 -18.659 3.349 -8.084 -18.3 3.349 -8.084 -18.16 0 -8.75 -18.546 0 -8.75
  [4,16,-18.659,3.349,-8.084,-18.3,3.349,-8.084,-18.16,0,-8.75,-18.546,0,-8.75],
// 3 272 -9.845 2.1485 -8.3227 -10.765 2.7186 -8.2094 -2.02 3.349 -8.084
  [3,272,-9.845,2.1485,-8.3227,-10.765,2.7186,-8.2094,-2.02,3.349,-8.084],
// 3 272 -12.0991 3.349 -8.084 -2.02 3.349 -8.084 -10.765 2.7186 -8.2094
  [3,272,-12.0991,3.349,-8.084,-2.02,3.349,-8.084,-10.765,2.7186,-8.2094],
// 3 272 -9.455 1.5736 -8.4371 -2.02 0 -8.75 -18.16 0 -8.75
  [3,272,-9.455,1.5736,-8.4371,-2.02,0,-8.75,-18.16,0,-8.75],
// 3 272 -9.845 2.1485 -8.3227 -2.02 3.349 -8.084 -9.365 1.6516 -8.4216
  [3,272,-9.845,2.1485,-8.3227,-2.02,3.349,-8.084,-9.365,1.6516,-8.4216],
// 4 272 -9.455 1.5736 -8.4371 -9.365 1.6516 -8.4216 -2.02 3.349 -8.084 -2.02 0 -8.75
  [4,272,-9.455,1.5736,-8.4371,-9.365,1.6516,-8.4216,-2.02,3.349,-8.084,-2.02,0,-8.75],
// 4 272 -12.68 2.8988 -8.1735 -18.16 0 -8.75 -18.3 3.349 -8.084 -14.1885 3.349 -8.084
  [4,272,-12.68,2.8988,-8.1735,-18.16,0,-8.75,-18.3,3.349,-8.084,-14.1885,3.349,-8.084],
// 4 272 -10.18 1.9049 -8.3712 -18.16 0 -8.75 -12.68 2.8988 -8.1735 -10.94 2.2411 -8.3043
  [4,272,-10.18,1.9049,-8.3712,-18.16,0,-8.75,-12.68,2.8988,-8.1735,-10.94,2.2411,-8.3043],
// 3 272 -10.18 1.9049 -8.3712 -9.455 1.5736 -8.4371 -18.16 0 -8.75
  [3,272,-10.18,1.9049,-8.3712,-9.455,1.5736,-8.4371,-18.16,0,-8.75],
// 4 0 -11.325 -1.8611 -8.3799 -11.105 -1.5639 -8.439 -10.635 -1.5444 -8.4429 -10.345 -1.788 -8.3944
  [4,0,-11.325,-1.8611,-8.3799,-11.105,-1.5639,-8.439,-10.635,-1.5444,-8.4429,-10.345,-1.788,-8.3944],
// 4 0 -10.345 -1.788 -8.3944 -10.52 -2.1437 -8.3237 -11.075 -2.1631 -8.3198 -11.325 -1.8611 -8.3799
  [4,0,-10.345,-1.788,-8.3944,-10.52,-2.1437,-8.3237,-11.075,-2.1631,-8.3198,-11.325,-1.8611,-8.3799],
// 4 0 -9.36 -3.349 -8.084 -9.48 -3.2204 -8.1096 -8.635 -3.2009 -8.1135 -8.7318 -3.349 -8.084
  [4,0,-9.36,-3.349,-8.084,-9.48,-3.2204,-8.1096,-8.635,-3.2009,-8.1135,-8.7318,-3.349,-8.084],
// 4 0 -9.48 -3.2204 -8.1096 -9.25 -2.9963 -8.1541 -8.815 -2.9963 -8.1541 -8.635 -3.2009 -8.1135
  [4,0,-9.48,-3.2204,-8.1096,-9.25,-2.9963,-8.1541,-8.815,-2.9963,-8.1541,-8.635,-3.2009,-8.1135],
// 4 16 -18.546 0 -8.75 -18.16 0 -8.75 -18.03 -3.349 -8.084 -18.433 -3.349 -8.084
  [4,16,-18.546,0,-8.75,-18.16,0,-8.75,-18.03,-3.349,-8.084,-18.433,-3.349,-8.084],
// 4 16 -2 -3.349 -8.084 -2.02 -3.349 -8.084 -2.02 0 -8.75 -2 0 -8.75
  [4,16,-2,-3.349,-8.084,-2.02,-3.349,-8.084,-2.02,0,-8.75,-2,0,-8.75],
// 3 272 -8.635 -3.2009 -8.1135 -2.02 -3.349 -8.084 -8.7318 -3.349 -8.084
  [3,272,-8.635,-3.2009,-8.1135,-2.02,-3.349,-8.084,-8.7318,-3.349,-8.084],
// 3 272 -9.36 -3.349 -8.084 -18.03 -3.349 -8.084 -9.48 -3.2204 -8.1096
  [3,272,-9.36,-3.349,-8.084,-18.03,-3.349,-8.084,-9.48,-3.2204,-8.1096],
// 4 272 -11.105 -1.5639 -8.439 -11.325 -1.8611 -8.3799 -18.03 -3.349 -8.084 -18.16 0 -8.75
  [4,272,-11.105,-1.5639,-8.439,-11.325,-1.8611,-8.3799,-18.03,-3.349,-8.084,-18.16,0,-8.75],
// 4 272 -10.635 -1.5444 -8.4429 -2.02 0 -8.75 -2.02 -3.349 -8.084 -10.345 -1.788 -8.3944
  [4,272,-10.635,-1.5444,-8.4429,-2.02,0,-8.75,-2.02,-3.349,-8.084,-10.345,-1.788,-8.3944],
// 4 272 -2.02 0 -8.75 -10.635 -1.5444 -8.4429 -11.105 -1.5639 -8.439 -18.16 0 -8.75
  [4,272,-2.02,0,-8.75,-10.635,-1.5444,-8.4429,-11.105,-1.5639,-8.439,-18.16,0,-8.75],
// 4 272 -10.345 -1.788 -8.3944 -9.25 -2.9963 -8.1541 -9.48 -3.2204 -8.1096 -10.52 -2.1437 -8.3237
  [4,272,-10.345,-1.788,-8.3944,-9.25,-2.9963,-8.1541,-9.48,-3.2204,-8.1096,-10.52,-2.1437,-8.3237],
// 4 272 -11.075 -2.1631 -8.3198 -10.52 -2.1437 -8.3237 -9.48 -3.2204 -8.1096 -18.03 -3.349 -8.084
  [4,272,-11.075,-2.1631,-8.3198,-10.52,-2.1437,-8.3237,-9.48,-3.2204,-8.1096,-18.03,-3.349,-8.084],
// 3 272 -8.815 -2.9963 -8.1541 -10.345 -1.788 -8.3944 -2.02 -3.349 -8.084
  [3,272,-8.815,-2.9963,-8.1541,-10.345,-1.788,-8.3944,-2.02,-3.349,-8.084],
// 3 272 -9.25 -2.9963 -8.1541 -10.345 -1.788 -8.3944 -8.815 -2.9963 -8.1541
  [3,272,-9.25,-2.9963,-8.1541,-10.345,-1.788,-8.3944,-8.815,-2.9963,-8.1541],
// 3 272 -11.075 -2.1631 -8.3198 -18.03 -3.349 -8.084 -11.325 -1.8611 -8.3799
  [3,272,-11.075,-2.1631,-8.3198,-18.03,-3.349,-8.084,-11.325,-1.8611,-8.3799],
// 3 272 -8.635 -3.2009 -8.1135 -8.815 -2.9963 -8.1541 -2.02 -3.349 -8.084
  [3,272,-8.635,-3.2009,-8.1135,-8.815,-2.9963,-8.1541,-2.02,-3.349,-8.084],
// 4 0 -8.8 -3.4413 -8.0223 -9.24 -3.4609 -8.0092 -9.36 -3.349 -8.084 -8.7318 -3.349 -8.084
  [4,0,-8.8,-3.4413,-8.0223,-9.24,-3.4609,-8.0092,-9.36,-3.349,-8.084,-8.7318,-3.349,-8.084],
// 4 16 -18.433 -3.349 -8.084 -18.03 -3.349 -8.084 -17.91 -6.1231 -6.2297 -18.337 -6.187 -6.187
  [4,16,-18.433,-3.349,-8.084,-18.03,-3.349,-8.084,-17.91,-6.1231,-6.2297,-18.337,-6.187,-6.187],
// 4 16 -2 -6.187 -6.187 -2.02 -6.1231 -6.2297 -2.02 -3.349 -8.084 -2 -3.349 -8.084
  [4,16,-2,-6.187,-6.187,-2.02,-6.1231,-6.2297,-2.02,-3.349,-8.084,-2,-3.349,-8.084],
// 4 16 -18.337 -6.187 -6.187 -17.91 -6.1231 -6.2297 -2.02 -6.1231 -6.2297 -2 -6.187 -6.187
  [4,16,-18.337,-6.187,-6.187,-17.91,-6.1231,-6.2297,-2.02,-6.1231,-6.2297,-2,-6.187,-6.187],
// 4 272 -17.91 -6.1231 -6.2297 -9.24 -3.4609 -8.0092 -8.8 -3.4413 -8.0223 -2.02 -6.1231 -6.2297
  [4,272,-17.91,-6.1231,-6.2297,-9.24,-3.4609,-8.0092,-8.8,-3.4413,-8.0223,-2.02,-6.1231,-6.2297],
// 4 272 -8.8 -3.4413 -8.0223 -8.7318 -3.349 -8.084 -2.02 -3.349 -8.084 -2.02 -6.1231 -6.2297
  [4,272,-8.8,-3.4413,-8.0223,-8.7318,-3.349,-8.084,-2.02,-3.349,-8.084,-2.02,-6.1231,-6.2297],
// 4 272 -9.24 -3.4609 -8.0092 -17.91 -6.1231 -6.2297 -18.03 -3.349 -8.084 -9.36 -3.349 -8.084
  [4,272,-9.24,-3.4609,-8.0092,-17.91,-6.1231,-6.2297,-18.03,-3.349,-8.084,-9.36,-3.349,-8.084],
];
module ldraw_lib__3816bpq0(step=0, col=false, unit=2/5, alt=false, line=0.2, solid=!$preview)
    makepoly(ldraw_lib__3816bpq0(), step=step, col=col, unit=unit, alt=alt, line=line, solid=solid);
ldraw_lib__3816bpq0(line=0.2);
